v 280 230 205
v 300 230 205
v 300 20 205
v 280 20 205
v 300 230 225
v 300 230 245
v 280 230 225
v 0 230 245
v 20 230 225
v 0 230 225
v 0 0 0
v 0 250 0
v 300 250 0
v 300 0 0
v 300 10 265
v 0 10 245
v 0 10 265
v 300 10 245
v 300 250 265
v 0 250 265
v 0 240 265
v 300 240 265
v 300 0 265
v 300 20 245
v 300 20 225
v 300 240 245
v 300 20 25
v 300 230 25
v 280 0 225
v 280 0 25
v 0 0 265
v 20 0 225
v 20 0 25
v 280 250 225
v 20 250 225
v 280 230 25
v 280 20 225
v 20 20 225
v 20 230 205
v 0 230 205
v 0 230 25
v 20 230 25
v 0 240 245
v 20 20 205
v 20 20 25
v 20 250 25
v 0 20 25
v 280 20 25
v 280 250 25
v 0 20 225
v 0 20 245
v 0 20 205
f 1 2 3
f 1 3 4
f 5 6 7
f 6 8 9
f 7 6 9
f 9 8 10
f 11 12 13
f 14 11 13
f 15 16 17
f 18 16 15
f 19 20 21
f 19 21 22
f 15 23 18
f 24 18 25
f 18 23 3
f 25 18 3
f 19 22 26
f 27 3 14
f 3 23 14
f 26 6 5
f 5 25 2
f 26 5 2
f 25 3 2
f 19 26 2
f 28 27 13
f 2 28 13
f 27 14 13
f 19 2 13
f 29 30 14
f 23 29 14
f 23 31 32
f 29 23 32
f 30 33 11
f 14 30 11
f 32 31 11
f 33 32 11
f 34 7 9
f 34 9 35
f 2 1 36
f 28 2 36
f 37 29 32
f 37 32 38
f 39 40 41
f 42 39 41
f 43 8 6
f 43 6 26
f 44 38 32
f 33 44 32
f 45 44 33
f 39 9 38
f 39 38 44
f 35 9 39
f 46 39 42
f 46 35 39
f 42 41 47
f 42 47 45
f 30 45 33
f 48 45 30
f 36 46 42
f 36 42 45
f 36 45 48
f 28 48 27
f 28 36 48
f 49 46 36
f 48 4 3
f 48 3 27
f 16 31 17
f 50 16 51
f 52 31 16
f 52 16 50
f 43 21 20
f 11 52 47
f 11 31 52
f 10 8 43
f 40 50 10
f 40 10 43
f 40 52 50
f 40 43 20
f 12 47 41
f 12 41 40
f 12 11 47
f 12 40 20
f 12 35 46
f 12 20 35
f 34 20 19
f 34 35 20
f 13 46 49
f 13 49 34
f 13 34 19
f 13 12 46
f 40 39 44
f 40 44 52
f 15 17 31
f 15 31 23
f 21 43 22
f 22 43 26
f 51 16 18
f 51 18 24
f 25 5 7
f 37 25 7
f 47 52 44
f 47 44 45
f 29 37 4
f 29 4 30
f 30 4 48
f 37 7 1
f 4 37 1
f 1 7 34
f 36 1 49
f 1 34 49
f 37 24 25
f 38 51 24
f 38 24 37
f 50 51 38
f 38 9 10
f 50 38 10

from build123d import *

# Parameters (mm, degrees)
SKETCH_1_W       = 300
SKETCH_1_H       = 250
EXTRUDE_1_DEPTH  = 25
SKETCH_2_W       = 20
SKETCH_2_H       = 20
EXTRUDE_3_DEPTH  = 200
SKETCH_3_W       = 20
SKETCH_3_H       = 20
EXTRUDE_4_DEPTH  = 20
SKETCH_4_W       = 20
SKETCH_4_H       = 20
EXTRUDE_5_DEPTH  = 20
SKETCH_5_W       = 20
SKETCH_5_H       = 20
EXTRUDE_6_DEPTH  = 20
SKETCH_6_W       = 20
SKETCH_6_H       = 20
EXTRUDE_7_DEPTH  = 20
EXTRUDE_8_REACH  = 450.247
SKETCH_8_W       = 20
SKETCH_8_H       = 20
EXTRUDE_9_REACH  = 452.472
SKETCH_9_W       = 20
SKETCH_9_H       = 20
SKETCH_10_W      = 300
SKETCH_10_H      = 10
EXTRUDE_11_DEPTH = 20


with BuildPart() as part:
    # 草图1 → 凸台-拉伸1 (new body)
    with BuildSketch(Plane.XY):
        with Locations((150, 125)):
            Rectangle(SKETCH_1_W, SKETCH_1_H)
    extrude(amount=EXTRUDE_1_DEPTH)

    # 草图2 → 凸台-拉伸3 (add)
    with BuildSketch(Plane.XY.offset(25)):
        with Locations((10, 10)):
            Rectangle(SKETCH_2_W, SKETCH_2_H)
        with Locations((10, 240)):
            Rectangle(SKETCH_2_W, SKETCH_2_H)
        with Locations((290, 240)):
            Rectangle(SKETCH_2_W, SKETCH_2_H)
        with Locations((290, 10)):
            Rectangle(SKETCH_2_W, SKETCH_2_H)
    extrude(amount=EXTRUDE_3_DEPTH)

    # 草图3 → 凸台-拉伸4 (add)
    with BuildSketch(Plane.XY.offset(225)):
        with Locations((10, 10)):
            Rectangle(SKETCH_3_W, SKETCH_3_H)
    extrude(amount=EXTRUDE_4_DEPTH)

    # 草图4 → 凸台-拉伸5 (add)
    with BuildSketch(Plane.XY.offset(225)):
        with Locations((290, 10)):
            Rectangle(SKETCH_4_W, SKETCH_4_H)
    extrude(amount=EXTRUDE_5_DEPTH)

    # 草图5 → 凸台-拉伸6 (add)
    with BuildSketch(Plane.XY.offset(225)):
        with Locations((290, 240)):
            Rectangle(SKETCH_5_W, SKETCH_5_H)
    extrude(amount=EXTRUDE_6_DEPTH)

    # 草图6 → 凸台-拉伸7 (add)
    with BuildSketch(Plane.XY.offset(225)):
        with Locations((10, 240)):
            Rectangle(SKETCH_6_W, SKETCH_6_H)
    extrude(amount=EXTRUDE_7_DEPTH)

    # 草图8 → 凸台-拉伸8 (add, up to next)
    with BuildSketch(Plane(origin=(20, 0, 0), x_dir=(0, 0, -1), z_dir=(1, 0, 0)), mode=Mode.PRIVATE) as extrude_8_sk1:
        with Locations((-235, 10)):
            Rectangle(SKETCH_8_W, SKETCH_8_H)
    extrude_8_tool1 = extrude(extrude_8_sk1.sketch, amount=EXTRUDE_8_REACH, mode=Mode.PRIVATE) - part.part
    # 草图8 → 凸台-拉伸8 (add, up to next)
    with BuildSketch(Plane(origin=(20, 0, 0), x_dir=(0, 0, -1), z_dir=(1, 0, 0)), mode=Mode.PRIVATE) as extrude_8_sk2:
        with Locations((-235, 240)):
            Rectangle(SKETCH_8_W, SKETCH_8_H)
    extrude_8_tool2 = extrude(extrude_8_sk2.sketch, amount=EXTRUDE_8_REACH, mode=Mode.PRIVATE) - part.part
    add(extrude_8_tool1.solids().sort_by_distance((20, 10, 235))[0])
    add(extrude_8_tool2.solids().sort_by_distance((20, 240, 235))[0])

    # 草图9 → 凸台-拉伸9 (add, up to next)
    with BuildSketch(Plane(origin=(0, 230, 0), x_dir=(-1, 0, 0), z_dir=(0, -1, 0)), mode=Mode.PRIVATE) as extrude_9_sk1:
        with Locations((-10, -215)):
            Rectangle(SKETCH_9_W, SKETCH_9_H)
    extrude_9_tool1 = extrude(extrude_9_sk1.sketch, amount=EXTRUDE_9_REACH, mode=Mode.PRIVATE) - part.part
    # 草图9 → 凸台-拉伸9 (add, up to next)
    with BuildSketch(Plane(origin=(0, 230, 0), x_dir=(-1, 0, 0), z_dir=(0, -1, 0)), mode=Mode.PRIVATE) as extrude_9_sk2:
        with Locations((-290, -215)):
            Rectangle(SKETCH_9_W, SKETCH_9_H)
    extrude_9_tool2 = extrude(extrude_9_sk2.sketch, amount=EXTRUDE_9_REACH, mode=Mode.PRIVATE) - part.part
    add(extrude_9_tool1.solids().sort_by_distance((10, 230, 215))[0])
    add(extrude_9_tool2.solids().sort_by_distance((290, 230, 215))[0])

    # 草图10 → 凸台-拉伸11 (add)
    with BuildSketch(Plane.XY.offset(245)):
        with Locations((150, 245)):
            Rectangle(SKETCH_10_W, SKETCH_10_H)
        with Locations((150, 5)):
            Rectangle(SKETCH_10_W, SKETCH_10_H)
    extrude(amount=EXTRUDE_11_DEPTH)


solid = part.part
